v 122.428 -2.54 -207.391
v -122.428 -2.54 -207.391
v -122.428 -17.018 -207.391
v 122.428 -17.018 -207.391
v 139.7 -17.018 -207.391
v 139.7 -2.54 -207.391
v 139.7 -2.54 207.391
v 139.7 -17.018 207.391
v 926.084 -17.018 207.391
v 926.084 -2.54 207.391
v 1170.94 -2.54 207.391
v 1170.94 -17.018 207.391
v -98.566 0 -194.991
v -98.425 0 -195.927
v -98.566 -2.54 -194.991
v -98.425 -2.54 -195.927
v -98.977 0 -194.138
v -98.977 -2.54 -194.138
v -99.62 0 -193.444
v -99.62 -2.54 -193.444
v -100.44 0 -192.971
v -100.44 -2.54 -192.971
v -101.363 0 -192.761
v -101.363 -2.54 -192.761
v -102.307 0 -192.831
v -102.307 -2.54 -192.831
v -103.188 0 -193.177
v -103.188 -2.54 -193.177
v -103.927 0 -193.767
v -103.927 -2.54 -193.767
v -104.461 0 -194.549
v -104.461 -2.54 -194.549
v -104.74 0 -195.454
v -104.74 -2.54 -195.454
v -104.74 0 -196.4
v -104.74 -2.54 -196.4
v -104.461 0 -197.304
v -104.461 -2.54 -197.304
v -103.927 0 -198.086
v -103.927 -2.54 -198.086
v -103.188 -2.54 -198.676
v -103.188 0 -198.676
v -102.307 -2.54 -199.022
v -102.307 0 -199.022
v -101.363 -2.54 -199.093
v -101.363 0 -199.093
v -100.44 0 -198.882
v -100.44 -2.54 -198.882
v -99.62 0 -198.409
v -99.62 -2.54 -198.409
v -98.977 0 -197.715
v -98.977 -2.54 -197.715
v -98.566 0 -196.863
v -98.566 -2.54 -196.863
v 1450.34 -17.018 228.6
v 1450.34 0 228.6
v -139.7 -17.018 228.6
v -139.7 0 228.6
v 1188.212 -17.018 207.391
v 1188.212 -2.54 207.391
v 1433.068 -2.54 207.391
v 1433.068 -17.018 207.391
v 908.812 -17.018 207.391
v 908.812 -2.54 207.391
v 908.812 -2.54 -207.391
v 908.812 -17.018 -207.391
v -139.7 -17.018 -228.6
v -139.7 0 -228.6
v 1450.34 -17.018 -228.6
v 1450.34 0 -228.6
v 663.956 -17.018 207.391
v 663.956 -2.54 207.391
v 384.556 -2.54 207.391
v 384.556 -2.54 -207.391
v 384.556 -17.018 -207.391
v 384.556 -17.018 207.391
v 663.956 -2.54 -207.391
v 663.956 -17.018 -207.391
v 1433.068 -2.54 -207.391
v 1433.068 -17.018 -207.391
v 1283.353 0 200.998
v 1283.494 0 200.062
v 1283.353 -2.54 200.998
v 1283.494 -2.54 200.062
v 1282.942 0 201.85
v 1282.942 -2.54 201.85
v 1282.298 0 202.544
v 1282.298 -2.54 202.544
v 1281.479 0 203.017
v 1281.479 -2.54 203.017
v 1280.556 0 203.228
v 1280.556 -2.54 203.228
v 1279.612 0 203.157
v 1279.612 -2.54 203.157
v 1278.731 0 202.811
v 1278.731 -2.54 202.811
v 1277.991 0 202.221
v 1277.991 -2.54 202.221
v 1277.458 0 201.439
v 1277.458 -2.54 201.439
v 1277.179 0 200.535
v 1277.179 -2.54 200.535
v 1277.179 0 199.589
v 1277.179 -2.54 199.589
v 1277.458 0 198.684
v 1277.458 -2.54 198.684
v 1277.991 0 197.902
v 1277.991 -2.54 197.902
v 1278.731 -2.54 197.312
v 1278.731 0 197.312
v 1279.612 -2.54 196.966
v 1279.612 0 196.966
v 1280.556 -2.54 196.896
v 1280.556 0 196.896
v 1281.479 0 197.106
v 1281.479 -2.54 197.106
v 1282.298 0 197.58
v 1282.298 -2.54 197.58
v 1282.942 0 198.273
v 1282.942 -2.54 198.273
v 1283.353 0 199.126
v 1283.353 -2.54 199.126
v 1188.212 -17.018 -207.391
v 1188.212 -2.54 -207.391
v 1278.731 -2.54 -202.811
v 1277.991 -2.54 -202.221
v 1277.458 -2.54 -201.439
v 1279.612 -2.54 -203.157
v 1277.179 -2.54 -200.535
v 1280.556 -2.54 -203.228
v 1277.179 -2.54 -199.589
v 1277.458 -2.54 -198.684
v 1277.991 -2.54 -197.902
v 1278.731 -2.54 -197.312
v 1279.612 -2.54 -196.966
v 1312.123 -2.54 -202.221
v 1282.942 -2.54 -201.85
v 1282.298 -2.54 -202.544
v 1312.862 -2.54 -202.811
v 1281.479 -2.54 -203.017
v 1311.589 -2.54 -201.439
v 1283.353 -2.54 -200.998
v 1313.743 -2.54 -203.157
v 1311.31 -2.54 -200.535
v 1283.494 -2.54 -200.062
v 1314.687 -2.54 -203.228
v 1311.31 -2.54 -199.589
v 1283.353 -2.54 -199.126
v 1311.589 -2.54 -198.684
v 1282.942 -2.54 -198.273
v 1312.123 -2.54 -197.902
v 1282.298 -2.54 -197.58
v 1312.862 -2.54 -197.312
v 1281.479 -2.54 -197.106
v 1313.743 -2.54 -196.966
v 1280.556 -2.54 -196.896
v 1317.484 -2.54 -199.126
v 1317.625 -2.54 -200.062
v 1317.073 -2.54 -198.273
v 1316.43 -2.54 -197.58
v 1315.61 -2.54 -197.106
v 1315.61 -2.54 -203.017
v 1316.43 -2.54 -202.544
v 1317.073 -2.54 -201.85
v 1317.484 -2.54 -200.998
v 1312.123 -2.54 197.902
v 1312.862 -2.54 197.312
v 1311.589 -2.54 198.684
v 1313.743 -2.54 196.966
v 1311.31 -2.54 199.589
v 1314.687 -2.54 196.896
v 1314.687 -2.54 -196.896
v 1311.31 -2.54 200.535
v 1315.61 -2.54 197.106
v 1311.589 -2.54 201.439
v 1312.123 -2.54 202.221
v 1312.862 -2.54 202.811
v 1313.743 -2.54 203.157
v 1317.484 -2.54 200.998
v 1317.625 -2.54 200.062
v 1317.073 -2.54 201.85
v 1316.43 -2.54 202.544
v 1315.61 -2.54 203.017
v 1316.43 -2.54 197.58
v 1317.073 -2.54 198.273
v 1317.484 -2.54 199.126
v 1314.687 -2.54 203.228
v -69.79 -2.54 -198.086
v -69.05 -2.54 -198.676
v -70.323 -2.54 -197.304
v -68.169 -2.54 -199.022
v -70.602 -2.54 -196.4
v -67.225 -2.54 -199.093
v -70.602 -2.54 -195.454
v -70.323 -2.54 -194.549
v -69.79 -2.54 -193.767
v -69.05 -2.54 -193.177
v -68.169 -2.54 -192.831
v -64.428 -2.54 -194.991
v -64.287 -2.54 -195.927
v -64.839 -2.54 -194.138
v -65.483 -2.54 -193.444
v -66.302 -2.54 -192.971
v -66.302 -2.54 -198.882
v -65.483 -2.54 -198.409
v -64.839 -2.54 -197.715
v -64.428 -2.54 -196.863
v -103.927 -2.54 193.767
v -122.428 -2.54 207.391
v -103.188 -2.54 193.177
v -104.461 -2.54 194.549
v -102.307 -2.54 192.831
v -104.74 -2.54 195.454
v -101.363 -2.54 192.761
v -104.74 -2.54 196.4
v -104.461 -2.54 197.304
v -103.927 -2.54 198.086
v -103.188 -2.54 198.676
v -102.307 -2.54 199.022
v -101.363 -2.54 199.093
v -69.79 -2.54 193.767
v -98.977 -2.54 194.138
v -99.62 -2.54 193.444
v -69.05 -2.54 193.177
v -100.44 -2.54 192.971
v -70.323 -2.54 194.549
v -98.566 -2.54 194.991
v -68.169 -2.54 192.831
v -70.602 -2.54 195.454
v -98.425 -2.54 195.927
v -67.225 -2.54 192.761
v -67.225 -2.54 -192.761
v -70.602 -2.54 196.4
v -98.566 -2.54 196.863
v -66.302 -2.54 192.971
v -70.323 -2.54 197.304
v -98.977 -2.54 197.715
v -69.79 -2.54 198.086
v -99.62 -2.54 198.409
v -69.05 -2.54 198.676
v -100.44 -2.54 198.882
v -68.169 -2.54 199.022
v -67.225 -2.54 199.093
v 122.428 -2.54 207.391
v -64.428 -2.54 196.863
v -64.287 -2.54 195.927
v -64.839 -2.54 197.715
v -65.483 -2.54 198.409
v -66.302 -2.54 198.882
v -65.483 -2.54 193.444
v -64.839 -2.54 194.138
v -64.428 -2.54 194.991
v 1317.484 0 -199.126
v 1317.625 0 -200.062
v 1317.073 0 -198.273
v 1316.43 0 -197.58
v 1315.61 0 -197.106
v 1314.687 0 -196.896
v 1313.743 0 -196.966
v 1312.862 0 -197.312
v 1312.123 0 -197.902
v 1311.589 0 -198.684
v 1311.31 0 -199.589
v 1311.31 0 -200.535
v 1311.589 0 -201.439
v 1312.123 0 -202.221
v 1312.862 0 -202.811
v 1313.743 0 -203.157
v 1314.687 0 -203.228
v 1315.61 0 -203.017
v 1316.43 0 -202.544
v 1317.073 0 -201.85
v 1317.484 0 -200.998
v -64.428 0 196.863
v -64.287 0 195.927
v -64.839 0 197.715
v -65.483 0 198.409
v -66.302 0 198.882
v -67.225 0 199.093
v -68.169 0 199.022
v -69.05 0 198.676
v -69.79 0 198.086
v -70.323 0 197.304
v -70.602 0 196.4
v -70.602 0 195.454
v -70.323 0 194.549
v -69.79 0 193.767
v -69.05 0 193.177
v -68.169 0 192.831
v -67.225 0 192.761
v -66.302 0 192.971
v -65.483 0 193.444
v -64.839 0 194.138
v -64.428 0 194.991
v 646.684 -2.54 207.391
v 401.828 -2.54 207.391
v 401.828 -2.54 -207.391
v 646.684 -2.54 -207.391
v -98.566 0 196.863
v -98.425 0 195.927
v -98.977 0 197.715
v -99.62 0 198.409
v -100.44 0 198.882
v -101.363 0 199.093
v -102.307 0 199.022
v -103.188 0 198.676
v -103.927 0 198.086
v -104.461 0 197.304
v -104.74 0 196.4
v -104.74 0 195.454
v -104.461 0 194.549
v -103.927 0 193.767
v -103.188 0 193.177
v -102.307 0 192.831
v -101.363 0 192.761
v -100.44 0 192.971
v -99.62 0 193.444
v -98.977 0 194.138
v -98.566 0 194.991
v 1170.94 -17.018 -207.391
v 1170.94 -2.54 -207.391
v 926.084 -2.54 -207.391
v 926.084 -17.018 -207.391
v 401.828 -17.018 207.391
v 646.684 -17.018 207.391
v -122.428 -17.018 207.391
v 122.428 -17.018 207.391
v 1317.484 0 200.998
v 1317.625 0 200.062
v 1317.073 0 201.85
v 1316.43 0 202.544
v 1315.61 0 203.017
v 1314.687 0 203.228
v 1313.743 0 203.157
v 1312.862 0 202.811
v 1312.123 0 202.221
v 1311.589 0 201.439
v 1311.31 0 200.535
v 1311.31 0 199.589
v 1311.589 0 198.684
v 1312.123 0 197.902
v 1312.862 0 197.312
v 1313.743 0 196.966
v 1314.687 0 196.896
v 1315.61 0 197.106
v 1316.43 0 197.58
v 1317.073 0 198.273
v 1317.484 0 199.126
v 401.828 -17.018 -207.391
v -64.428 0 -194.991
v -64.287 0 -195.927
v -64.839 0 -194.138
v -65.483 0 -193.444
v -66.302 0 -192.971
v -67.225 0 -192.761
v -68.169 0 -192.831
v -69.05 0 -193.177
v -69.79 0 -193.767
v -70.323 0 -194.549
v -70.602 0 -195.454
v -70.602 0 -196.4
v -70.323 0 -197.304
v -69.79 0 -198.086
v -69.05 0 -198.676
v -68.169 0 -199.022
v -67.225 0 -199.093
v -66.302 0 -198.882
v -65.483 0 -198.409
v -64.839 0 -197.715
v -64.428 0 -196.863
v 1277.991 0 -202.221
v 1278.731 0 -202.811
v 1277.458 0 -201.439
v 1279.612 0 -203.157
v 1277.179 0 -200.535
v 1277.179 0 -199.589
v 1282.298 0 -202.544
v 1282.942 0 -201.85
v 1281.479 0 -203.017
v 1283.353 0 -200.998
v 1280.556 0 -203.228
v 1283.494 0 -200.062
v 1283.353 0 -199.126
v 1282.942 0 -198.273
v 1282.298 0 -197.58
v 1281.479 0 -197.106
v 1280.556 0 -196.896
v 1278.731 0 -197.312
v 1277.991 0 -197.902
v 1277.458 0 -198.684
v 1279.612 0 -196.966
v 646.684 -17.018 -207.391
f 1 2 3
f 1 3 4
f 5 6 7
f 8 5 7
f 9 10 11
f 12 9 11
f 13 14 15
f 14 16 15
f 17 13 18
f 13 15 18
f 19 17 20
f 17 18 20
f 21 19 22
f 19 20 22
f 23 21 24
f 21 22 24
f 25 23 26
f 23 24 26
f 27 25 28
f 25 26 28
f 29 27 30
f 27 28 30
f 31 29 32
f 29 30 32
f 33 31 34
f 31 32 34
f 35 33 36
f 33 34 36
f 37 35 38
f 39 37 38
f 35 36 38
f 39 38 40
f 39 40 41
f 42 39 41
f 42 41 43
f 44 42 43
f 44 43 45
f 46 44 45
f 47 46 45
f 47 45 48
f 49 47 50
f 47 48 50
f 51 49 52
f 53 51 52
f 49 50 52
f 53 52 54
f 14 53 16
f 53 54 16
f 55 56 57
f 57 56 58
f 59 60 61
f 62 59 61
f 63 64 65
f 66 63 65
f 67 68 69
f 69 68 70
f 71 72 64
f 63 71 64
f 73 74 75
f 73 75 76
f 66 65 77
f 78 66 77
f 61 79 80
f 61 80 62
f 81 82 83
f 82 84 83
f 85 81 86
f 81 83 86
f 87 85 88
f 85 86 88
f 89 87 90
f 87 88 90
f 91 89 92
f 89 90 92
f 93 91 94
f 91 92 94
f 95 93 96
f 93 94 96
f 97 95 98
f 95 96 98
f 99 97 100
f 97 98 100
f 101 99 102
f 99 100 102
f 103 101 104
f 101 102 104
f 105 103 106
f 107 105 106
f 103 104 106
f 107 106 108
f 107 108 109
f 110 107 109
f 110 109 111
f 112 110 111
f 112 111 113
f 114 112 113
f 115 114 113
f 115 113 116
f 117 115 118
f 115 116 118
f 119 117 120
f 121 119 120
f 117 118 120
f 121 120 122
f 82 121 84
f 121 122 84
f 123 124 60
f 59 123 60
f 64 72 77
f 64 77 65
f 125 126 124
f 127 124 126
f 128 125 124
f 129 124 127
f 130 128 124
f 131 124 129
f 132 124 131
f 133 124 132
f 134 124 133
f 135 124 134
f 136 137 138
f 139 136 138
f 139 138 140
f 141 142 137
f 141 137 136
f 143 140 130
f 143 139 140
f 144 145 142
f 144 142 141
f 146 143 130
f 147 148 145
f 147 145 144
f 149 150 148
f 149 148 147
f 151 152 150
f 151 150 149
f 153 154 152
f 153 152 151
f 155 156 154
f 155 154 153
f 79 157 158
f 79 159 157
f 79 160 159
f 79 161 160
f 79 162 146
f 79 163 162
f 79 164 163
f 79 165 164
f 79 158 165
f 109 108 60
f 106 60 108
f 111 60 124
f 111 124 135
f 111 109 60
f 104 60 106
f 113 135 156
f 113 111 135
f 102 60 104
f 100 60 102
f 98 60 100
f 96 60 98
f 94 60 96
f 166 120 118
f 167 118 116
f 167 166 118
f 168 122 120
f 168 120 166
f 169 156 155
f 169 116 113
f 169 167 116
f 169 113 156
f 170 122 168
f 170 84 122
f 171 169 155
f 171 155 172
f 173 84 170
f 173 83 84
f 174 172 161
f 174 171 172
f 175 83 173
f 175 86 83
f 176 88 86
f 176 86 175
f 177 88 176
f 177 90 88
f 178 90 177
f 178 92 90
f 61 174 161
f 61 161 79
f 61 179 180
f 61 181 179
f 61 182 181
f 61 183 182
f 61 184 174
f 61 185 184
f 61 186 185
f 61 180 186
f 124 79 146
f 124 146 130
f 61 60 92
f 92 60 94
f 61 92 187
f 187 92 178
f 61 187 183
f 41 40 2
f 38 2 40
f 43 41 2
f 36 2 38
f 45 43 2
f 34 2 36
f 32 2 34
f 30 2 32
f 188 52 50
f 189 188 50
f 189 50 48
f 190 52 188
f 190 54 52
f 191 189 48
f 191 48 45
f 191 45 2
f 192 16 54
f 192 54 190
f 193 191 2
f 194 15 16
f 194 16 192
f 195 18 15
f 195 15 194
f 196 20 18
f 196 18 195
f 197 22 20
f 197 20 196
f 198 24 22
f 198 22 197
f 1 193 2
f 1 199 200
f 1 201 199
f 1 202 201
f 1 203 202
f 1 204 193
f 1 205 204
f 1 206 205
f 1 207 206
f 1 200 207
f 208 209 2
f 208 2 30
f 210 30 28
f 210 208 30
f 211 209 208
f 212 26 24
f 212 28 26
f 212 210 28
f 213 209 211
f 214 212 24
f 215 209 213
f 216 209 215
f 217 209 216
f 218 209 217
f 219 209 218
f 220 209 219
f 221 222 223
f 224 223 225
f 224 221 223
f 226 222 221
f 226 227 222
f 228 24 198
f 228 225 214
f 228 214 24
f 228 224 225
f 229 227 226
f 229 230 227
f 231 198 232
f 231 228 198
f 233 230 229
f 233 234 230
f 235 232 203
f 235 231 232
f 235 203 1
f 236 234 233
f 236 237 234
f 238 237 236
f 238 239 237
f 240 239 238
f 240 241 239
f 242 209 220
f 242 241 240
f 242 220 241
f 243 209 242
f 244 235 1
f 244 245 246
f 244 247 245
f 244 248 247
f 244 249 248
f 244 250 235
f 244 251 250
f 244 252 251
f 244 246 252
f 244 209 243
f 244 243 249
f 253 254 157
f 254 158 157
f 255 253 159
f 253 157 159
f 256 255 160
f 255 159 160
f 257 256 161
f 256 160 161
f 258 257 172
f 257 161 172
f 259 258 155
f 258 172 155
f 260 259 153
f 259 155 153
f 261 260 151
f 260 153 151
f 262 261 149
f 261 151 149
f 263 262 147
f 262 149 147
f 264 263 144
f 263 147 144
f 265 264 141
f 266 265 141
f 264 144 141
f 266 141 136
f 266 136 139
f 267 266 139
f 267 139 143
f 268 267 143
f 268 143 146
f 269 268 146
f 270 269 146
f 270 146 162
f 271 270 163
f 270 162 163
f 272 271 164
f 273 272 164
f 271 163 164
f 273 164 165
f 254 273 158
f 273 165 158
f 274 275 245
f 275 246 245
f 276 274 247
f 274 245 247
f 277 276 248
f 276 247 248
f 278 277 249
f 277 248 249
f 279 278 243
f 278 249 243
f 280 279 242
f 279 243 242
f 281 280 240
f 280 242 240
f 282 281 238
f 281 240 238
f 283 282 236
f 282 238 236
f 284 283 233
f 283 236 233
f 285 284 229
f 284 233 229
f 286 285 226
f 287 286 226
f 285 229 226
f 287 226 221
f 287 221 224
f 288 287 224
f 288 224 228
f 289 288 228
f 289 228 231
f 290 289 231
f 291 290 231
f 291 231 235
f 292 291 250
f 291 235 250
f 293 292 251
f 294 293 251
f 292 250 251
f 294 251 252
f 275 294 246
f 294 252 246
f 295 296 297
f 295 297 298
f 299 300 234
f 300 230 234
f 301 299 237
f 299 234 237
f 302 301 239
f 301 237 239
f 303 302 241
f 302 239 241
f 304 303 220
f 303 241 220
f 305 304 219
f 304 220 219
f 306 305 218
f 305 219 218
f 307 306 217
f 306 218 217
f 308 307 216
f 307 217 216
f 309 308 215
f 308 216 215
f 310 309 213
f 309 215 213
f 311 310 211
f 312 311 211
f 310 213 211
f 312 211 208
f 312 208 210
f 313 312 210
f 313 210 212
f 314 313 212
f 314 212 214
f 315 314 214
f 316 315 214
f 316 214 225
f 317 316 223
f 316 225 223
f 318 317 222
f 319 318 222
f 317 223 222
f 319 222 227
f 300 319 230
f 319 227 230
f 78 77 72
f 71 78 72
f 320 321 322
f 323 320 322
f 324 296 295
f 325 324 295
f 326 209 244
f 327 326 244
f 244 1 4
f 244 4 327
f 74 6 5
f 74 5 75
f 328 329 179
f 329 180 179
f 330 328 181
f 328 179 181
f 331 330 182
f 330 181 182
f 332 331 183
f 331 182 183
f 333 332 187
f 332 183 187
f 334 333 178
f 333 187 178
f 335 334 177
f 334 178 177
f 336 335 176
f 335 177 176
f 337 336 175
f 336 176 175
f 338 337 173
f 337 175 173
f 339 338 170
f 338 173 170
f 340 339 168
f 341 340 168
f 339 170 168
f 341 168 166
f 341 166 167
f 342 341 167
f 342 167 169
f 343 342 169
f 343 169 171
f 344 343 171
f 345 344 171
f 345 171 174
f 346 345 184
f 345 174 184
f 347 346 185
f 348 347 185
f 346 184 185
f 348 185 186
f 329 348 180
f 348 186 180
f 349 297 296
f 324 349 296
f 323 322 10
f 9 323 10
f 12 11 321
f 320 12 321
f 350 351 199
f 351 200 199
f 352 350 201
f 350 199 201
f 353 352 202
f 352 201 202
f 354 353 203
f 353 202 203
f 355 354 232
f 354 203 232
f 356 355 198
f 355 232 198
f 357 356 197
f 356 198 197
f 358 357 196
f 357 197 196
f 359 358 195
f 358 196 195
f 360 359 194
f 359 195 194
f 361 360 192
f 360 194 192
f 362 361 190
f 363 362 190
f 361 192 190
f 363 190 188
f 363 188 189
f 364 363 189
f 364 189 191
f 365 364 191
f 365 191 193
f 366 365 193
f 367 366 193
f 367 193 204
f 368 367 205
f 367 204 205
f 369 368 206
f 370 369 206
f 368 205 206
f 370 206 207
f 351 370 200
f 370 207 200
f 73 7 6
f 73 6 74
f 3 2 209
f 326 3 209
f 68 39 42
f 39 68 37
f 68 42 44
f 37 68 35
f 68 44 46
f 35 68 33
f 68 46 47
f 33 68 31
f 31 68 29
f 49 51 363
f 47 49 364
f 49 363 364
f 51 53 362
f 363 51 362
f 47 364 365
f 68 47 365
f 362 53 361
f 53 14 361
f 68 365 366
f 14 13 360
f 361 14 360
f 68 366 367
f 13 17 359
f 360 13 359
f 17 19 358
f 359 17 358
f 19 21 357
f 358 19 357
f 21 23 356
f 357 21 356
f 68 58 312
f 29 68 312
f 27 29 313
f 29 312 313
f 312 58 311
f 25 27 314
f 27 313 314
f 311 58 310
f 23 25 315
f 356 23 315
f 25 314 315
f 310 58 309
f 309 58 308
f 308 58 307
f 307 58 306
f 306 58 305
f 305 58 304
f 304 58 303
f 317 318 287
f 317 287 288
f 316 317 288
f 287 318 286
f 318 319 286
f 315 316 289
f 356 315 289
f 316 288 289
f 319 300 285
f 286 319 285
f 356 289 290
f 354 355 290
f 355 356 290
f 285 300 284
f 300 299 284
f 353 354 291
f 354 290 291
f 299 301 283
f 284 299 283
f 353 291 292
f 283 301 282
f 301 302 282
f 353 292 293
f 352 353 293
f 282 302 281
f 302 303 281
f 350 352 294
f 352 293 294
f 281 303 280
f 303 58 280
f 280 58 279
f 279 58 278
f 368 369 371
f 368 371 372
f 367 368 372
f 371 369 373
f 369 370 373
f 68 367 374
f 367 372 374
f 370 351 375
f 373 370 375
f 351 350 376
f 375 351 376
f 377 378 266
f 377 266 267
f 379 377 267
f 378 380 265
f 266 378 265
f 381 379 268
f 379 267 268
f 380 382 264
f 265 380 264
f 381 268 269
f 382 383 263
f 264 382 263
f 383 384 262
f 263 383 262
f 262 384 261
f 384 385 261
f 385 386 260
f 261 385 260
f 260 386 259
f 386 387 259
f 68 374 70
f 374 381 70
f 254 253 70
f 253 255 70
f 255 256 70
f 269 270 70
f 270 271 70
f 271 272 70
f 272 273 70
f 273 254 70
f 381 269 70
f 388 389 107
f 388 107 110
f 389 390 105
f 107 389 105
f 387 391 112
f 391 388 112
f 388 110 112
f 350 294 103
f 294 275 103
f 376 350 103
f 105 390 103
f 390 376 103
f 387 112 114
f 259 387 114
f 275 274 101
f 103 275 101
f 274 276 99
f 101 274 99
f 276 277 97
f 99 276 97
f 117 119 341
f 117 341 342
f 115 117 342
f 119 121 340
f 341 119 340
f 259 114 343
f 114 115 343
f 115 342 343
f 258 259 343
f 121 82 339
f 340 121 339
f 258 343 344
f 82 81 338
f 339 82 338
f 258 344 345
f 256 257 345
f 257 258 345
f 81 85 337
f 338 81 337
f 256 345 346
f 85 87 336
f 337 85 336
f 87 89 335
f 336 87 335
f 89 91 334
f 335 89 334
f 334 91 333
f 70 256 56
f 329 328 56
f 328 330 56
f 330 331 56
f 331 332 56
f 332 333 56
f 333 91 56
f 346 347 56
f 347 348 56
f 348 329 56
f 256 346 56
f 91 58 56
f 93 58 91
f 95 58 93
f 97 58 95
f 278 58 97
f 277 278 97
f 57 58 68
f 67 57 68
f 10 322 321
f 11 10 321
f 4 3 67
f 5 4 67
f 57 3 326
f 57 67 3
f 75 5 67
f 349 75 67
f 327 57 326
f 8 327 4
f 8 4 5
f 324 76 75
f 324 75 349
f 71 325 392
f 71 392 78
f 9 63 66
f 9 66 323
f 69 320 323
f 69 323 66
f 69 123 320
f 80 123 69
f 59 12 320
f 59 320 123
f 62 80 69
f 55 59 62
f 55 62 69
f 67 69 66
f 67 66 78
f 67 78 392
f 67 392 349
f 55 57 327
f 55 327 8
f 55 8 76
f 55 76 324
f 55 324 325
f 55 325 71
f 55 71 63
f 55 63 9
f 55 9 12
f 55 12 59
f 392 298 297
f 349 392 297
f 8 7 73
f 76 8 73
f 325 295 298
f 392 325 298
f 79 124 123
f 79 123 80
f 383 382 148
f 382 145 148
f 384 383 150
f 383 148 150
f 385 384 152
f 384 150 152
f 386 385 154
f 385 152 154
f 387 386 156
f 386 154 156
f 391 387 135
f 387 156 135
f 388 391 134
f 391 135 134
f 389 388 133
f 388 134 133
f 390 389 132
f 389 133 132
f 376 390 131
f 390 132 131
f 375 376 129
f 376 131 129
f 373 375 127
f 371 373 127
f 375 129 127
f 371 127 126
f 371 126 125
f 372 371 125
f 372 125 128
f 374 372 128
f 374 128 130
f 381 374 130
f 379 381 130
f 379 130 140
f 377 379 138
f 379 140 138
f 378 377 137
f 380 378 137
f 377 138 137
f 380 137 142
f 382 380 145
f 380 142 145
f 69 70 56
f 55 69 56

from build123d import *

# Parameters (mm, degrees)
F0_W     = 244.856
F0_H     = 414.782
F1_DEPTH = 17.018
F2_DEPTH = 2.54
F4_D     = 6.35
F4_DEPTH = 2.54
F4_TIP   = 1.9077324654


# Not quite as in the source:
# - a feature names something its author has since deleted; it is built from what else it names


with BuildPart() as f1:
    # F0 (on Front) → F1 (new body)
    with BuildSketch(Plane.XZ):
        Polygon((350.52, 228.6), (139.7, 228.6), (105.41, 228.6), (-139.7, 228.6), (-139.7, -228.6), (105.41, -228.6), (139.7, -228.6), (350.52, -228.6), (384.81, -228.6), (595.63, -228.6), (629.92, -228.6), (840.74, -228.6), (875.03, -228.6), (1085.85, -228.6), (1120.14, -228.6), (1365.25, -228.6), (1450.34, -228.6), (1450.34, 228.6), (1365.25, 228.6), (1120.14, 228.6), (1085.85, 228.6), (875.03, 228.6), (840.74, 228.6), (629.92, 228.6), (595.63, 228.6), (384.81, 228.6), align=None)
        Rectangle(F0_W, F0_H, mode=Mode.SUBTRACT)
        with Locations((262.128, 0)):
            Rectangle(F0_W, F0_H, mode=Mode.SUBTRACT)
        Polygon((629.92, 207.391), (646.684, 207.391), (646.684, -207.391), (629.92, -207.391), (401.828, -207.391), (401.828, 207.391), align=None, mode=Mode.SUBTRACT)
        Polygon((875.03, 207.391), (908.812, 207.391), (908.812, -207.391), (875.03, -207.391), (663.956, -207.391), (663.956, 207.391), align=None, mode=Mode.SUBTRACT)
        Polygon((1120.14, 207.391), (1170.94, 207.391), (1170.94, -207.391), (1120.14, -207.391), (926.084, -207.391), (926.084, 207.391), align=None, mode=Mode.SUBTRACT)
        with Locations((1310.64, 0)):
            Rectangle(F0_W, F0_H, mode=Mode.SUBTRACT)
    extrude(amount=F1_DEPTH)

    # F0 (on Front) → F2 (join)
    with BuildSketch(Plane.XZ):
        Polygon((350.52, 228.6), (139.7, 228.6), (105.41, 228.6), (-139.7, 228.6), (-139.7, -228.6), (105.41, -228.6), (139.7, -228.6), (350.52, -228.6), (384.81, -228.6), (595.63, -228.6), (629.92, -228.6), (840.74, -228.6), (875.03, -228.6), (1085.85, -228.6), (1120.14, -228.6), (1365.25, -228.6), (1450.34, -228.6), (1450.34, 228.6), (1365.25, 228.6), (1120.14, 228.6), (1085.85, 228.6), (875.03, 228.6), (840.74, 228.6), (629.92, 228.6), (595.63, 228.6), (384.81, 228.6), align=None)
        Rectangle(F0_W, F0_H, mode=Mode.SUBTRACT)
        with Locations((262.128, 0)):
            Rectangle(F0_W, F0_H, mode=Mode.SUBTRACT)
        Polygon((629.92, 207.391), (646.684, 207.391), (646.684, -207.391), (629.92, -207.391), (401.828, -207.391), (401.828, 207.391), align=None, mode=Mode.SUBTRACT)
        Polygon((875.03, 207.391), (908.812, 207.391), (908.812, -207.391), (875.03, -207.391), (663.956, -207.391), (663.956, 207.391), align=None, mode=Mode.SUBTRACT)
        Polygon((1120.14, 207.391), (1170.94, 207.391), (1170.94, -207.391), (1120.14, -207.391), (926.084, -207.391), (926.084, 207.391), align=None, mode=Mode.SUBTRACT)
        with Locations((1310.64, 0)):
            Rectangle(F0_W, F0_H, mode=Mode.SUBTRACT)
        Rectangle(F0_W, F0_H)
        with Locations((262.128, 0)):
            Rectangle(F0_W, F0_H)
        Polygon((646.684, -207.391), (646.684, 207.391), (629.92, 207.391), (401.828, 207.391), (401.828, -207.391), (629.92, -207.391), align=None)
        Polygon((908.812, -207.391), (908.812, 207.391), (875.03, 207.391), (663.956, 207.391), (663.956, -207.391), (875.03, -207.391), align=None)
        Polygon((1170.94, -207.391), (1170.94, 207.391), (1120.14, 207.391), (926.084, 207.391), (926.084, -207.391), (1120.14, -207.391), align=None)
        with Locations((1310.64, 0)):
            Rectangle(F0_W, F0_H)
    extrude(amount=F2_DEPTH)

    # F4
    with Locations(Plane(origin=(0, 0, 0), x_dir=(-1, 0, 0), z_dir=(0, 1, 0))):
        with Locations((-1314.45, 200.061827898), (-1280.31875, 200.061827898), (67.4624, 195.9268003702), (101.6, 195.9268003702), (-1314.45, -200.061827898), (-1280.31875, -200.061827898), (67.4624, -195.9268003702), (101.6, -195.9268003702)):
            Hole(F4_D / 2, depth=F4_DEPTH)
            with Locations((0, 0, -(F4_DEPTH + F4_TIP / 2))):  # 118° drill point
                Cone(0, F4_D / 2, F4_TIP, mode=Mode.SUBTRACT)


solid = f1.part
